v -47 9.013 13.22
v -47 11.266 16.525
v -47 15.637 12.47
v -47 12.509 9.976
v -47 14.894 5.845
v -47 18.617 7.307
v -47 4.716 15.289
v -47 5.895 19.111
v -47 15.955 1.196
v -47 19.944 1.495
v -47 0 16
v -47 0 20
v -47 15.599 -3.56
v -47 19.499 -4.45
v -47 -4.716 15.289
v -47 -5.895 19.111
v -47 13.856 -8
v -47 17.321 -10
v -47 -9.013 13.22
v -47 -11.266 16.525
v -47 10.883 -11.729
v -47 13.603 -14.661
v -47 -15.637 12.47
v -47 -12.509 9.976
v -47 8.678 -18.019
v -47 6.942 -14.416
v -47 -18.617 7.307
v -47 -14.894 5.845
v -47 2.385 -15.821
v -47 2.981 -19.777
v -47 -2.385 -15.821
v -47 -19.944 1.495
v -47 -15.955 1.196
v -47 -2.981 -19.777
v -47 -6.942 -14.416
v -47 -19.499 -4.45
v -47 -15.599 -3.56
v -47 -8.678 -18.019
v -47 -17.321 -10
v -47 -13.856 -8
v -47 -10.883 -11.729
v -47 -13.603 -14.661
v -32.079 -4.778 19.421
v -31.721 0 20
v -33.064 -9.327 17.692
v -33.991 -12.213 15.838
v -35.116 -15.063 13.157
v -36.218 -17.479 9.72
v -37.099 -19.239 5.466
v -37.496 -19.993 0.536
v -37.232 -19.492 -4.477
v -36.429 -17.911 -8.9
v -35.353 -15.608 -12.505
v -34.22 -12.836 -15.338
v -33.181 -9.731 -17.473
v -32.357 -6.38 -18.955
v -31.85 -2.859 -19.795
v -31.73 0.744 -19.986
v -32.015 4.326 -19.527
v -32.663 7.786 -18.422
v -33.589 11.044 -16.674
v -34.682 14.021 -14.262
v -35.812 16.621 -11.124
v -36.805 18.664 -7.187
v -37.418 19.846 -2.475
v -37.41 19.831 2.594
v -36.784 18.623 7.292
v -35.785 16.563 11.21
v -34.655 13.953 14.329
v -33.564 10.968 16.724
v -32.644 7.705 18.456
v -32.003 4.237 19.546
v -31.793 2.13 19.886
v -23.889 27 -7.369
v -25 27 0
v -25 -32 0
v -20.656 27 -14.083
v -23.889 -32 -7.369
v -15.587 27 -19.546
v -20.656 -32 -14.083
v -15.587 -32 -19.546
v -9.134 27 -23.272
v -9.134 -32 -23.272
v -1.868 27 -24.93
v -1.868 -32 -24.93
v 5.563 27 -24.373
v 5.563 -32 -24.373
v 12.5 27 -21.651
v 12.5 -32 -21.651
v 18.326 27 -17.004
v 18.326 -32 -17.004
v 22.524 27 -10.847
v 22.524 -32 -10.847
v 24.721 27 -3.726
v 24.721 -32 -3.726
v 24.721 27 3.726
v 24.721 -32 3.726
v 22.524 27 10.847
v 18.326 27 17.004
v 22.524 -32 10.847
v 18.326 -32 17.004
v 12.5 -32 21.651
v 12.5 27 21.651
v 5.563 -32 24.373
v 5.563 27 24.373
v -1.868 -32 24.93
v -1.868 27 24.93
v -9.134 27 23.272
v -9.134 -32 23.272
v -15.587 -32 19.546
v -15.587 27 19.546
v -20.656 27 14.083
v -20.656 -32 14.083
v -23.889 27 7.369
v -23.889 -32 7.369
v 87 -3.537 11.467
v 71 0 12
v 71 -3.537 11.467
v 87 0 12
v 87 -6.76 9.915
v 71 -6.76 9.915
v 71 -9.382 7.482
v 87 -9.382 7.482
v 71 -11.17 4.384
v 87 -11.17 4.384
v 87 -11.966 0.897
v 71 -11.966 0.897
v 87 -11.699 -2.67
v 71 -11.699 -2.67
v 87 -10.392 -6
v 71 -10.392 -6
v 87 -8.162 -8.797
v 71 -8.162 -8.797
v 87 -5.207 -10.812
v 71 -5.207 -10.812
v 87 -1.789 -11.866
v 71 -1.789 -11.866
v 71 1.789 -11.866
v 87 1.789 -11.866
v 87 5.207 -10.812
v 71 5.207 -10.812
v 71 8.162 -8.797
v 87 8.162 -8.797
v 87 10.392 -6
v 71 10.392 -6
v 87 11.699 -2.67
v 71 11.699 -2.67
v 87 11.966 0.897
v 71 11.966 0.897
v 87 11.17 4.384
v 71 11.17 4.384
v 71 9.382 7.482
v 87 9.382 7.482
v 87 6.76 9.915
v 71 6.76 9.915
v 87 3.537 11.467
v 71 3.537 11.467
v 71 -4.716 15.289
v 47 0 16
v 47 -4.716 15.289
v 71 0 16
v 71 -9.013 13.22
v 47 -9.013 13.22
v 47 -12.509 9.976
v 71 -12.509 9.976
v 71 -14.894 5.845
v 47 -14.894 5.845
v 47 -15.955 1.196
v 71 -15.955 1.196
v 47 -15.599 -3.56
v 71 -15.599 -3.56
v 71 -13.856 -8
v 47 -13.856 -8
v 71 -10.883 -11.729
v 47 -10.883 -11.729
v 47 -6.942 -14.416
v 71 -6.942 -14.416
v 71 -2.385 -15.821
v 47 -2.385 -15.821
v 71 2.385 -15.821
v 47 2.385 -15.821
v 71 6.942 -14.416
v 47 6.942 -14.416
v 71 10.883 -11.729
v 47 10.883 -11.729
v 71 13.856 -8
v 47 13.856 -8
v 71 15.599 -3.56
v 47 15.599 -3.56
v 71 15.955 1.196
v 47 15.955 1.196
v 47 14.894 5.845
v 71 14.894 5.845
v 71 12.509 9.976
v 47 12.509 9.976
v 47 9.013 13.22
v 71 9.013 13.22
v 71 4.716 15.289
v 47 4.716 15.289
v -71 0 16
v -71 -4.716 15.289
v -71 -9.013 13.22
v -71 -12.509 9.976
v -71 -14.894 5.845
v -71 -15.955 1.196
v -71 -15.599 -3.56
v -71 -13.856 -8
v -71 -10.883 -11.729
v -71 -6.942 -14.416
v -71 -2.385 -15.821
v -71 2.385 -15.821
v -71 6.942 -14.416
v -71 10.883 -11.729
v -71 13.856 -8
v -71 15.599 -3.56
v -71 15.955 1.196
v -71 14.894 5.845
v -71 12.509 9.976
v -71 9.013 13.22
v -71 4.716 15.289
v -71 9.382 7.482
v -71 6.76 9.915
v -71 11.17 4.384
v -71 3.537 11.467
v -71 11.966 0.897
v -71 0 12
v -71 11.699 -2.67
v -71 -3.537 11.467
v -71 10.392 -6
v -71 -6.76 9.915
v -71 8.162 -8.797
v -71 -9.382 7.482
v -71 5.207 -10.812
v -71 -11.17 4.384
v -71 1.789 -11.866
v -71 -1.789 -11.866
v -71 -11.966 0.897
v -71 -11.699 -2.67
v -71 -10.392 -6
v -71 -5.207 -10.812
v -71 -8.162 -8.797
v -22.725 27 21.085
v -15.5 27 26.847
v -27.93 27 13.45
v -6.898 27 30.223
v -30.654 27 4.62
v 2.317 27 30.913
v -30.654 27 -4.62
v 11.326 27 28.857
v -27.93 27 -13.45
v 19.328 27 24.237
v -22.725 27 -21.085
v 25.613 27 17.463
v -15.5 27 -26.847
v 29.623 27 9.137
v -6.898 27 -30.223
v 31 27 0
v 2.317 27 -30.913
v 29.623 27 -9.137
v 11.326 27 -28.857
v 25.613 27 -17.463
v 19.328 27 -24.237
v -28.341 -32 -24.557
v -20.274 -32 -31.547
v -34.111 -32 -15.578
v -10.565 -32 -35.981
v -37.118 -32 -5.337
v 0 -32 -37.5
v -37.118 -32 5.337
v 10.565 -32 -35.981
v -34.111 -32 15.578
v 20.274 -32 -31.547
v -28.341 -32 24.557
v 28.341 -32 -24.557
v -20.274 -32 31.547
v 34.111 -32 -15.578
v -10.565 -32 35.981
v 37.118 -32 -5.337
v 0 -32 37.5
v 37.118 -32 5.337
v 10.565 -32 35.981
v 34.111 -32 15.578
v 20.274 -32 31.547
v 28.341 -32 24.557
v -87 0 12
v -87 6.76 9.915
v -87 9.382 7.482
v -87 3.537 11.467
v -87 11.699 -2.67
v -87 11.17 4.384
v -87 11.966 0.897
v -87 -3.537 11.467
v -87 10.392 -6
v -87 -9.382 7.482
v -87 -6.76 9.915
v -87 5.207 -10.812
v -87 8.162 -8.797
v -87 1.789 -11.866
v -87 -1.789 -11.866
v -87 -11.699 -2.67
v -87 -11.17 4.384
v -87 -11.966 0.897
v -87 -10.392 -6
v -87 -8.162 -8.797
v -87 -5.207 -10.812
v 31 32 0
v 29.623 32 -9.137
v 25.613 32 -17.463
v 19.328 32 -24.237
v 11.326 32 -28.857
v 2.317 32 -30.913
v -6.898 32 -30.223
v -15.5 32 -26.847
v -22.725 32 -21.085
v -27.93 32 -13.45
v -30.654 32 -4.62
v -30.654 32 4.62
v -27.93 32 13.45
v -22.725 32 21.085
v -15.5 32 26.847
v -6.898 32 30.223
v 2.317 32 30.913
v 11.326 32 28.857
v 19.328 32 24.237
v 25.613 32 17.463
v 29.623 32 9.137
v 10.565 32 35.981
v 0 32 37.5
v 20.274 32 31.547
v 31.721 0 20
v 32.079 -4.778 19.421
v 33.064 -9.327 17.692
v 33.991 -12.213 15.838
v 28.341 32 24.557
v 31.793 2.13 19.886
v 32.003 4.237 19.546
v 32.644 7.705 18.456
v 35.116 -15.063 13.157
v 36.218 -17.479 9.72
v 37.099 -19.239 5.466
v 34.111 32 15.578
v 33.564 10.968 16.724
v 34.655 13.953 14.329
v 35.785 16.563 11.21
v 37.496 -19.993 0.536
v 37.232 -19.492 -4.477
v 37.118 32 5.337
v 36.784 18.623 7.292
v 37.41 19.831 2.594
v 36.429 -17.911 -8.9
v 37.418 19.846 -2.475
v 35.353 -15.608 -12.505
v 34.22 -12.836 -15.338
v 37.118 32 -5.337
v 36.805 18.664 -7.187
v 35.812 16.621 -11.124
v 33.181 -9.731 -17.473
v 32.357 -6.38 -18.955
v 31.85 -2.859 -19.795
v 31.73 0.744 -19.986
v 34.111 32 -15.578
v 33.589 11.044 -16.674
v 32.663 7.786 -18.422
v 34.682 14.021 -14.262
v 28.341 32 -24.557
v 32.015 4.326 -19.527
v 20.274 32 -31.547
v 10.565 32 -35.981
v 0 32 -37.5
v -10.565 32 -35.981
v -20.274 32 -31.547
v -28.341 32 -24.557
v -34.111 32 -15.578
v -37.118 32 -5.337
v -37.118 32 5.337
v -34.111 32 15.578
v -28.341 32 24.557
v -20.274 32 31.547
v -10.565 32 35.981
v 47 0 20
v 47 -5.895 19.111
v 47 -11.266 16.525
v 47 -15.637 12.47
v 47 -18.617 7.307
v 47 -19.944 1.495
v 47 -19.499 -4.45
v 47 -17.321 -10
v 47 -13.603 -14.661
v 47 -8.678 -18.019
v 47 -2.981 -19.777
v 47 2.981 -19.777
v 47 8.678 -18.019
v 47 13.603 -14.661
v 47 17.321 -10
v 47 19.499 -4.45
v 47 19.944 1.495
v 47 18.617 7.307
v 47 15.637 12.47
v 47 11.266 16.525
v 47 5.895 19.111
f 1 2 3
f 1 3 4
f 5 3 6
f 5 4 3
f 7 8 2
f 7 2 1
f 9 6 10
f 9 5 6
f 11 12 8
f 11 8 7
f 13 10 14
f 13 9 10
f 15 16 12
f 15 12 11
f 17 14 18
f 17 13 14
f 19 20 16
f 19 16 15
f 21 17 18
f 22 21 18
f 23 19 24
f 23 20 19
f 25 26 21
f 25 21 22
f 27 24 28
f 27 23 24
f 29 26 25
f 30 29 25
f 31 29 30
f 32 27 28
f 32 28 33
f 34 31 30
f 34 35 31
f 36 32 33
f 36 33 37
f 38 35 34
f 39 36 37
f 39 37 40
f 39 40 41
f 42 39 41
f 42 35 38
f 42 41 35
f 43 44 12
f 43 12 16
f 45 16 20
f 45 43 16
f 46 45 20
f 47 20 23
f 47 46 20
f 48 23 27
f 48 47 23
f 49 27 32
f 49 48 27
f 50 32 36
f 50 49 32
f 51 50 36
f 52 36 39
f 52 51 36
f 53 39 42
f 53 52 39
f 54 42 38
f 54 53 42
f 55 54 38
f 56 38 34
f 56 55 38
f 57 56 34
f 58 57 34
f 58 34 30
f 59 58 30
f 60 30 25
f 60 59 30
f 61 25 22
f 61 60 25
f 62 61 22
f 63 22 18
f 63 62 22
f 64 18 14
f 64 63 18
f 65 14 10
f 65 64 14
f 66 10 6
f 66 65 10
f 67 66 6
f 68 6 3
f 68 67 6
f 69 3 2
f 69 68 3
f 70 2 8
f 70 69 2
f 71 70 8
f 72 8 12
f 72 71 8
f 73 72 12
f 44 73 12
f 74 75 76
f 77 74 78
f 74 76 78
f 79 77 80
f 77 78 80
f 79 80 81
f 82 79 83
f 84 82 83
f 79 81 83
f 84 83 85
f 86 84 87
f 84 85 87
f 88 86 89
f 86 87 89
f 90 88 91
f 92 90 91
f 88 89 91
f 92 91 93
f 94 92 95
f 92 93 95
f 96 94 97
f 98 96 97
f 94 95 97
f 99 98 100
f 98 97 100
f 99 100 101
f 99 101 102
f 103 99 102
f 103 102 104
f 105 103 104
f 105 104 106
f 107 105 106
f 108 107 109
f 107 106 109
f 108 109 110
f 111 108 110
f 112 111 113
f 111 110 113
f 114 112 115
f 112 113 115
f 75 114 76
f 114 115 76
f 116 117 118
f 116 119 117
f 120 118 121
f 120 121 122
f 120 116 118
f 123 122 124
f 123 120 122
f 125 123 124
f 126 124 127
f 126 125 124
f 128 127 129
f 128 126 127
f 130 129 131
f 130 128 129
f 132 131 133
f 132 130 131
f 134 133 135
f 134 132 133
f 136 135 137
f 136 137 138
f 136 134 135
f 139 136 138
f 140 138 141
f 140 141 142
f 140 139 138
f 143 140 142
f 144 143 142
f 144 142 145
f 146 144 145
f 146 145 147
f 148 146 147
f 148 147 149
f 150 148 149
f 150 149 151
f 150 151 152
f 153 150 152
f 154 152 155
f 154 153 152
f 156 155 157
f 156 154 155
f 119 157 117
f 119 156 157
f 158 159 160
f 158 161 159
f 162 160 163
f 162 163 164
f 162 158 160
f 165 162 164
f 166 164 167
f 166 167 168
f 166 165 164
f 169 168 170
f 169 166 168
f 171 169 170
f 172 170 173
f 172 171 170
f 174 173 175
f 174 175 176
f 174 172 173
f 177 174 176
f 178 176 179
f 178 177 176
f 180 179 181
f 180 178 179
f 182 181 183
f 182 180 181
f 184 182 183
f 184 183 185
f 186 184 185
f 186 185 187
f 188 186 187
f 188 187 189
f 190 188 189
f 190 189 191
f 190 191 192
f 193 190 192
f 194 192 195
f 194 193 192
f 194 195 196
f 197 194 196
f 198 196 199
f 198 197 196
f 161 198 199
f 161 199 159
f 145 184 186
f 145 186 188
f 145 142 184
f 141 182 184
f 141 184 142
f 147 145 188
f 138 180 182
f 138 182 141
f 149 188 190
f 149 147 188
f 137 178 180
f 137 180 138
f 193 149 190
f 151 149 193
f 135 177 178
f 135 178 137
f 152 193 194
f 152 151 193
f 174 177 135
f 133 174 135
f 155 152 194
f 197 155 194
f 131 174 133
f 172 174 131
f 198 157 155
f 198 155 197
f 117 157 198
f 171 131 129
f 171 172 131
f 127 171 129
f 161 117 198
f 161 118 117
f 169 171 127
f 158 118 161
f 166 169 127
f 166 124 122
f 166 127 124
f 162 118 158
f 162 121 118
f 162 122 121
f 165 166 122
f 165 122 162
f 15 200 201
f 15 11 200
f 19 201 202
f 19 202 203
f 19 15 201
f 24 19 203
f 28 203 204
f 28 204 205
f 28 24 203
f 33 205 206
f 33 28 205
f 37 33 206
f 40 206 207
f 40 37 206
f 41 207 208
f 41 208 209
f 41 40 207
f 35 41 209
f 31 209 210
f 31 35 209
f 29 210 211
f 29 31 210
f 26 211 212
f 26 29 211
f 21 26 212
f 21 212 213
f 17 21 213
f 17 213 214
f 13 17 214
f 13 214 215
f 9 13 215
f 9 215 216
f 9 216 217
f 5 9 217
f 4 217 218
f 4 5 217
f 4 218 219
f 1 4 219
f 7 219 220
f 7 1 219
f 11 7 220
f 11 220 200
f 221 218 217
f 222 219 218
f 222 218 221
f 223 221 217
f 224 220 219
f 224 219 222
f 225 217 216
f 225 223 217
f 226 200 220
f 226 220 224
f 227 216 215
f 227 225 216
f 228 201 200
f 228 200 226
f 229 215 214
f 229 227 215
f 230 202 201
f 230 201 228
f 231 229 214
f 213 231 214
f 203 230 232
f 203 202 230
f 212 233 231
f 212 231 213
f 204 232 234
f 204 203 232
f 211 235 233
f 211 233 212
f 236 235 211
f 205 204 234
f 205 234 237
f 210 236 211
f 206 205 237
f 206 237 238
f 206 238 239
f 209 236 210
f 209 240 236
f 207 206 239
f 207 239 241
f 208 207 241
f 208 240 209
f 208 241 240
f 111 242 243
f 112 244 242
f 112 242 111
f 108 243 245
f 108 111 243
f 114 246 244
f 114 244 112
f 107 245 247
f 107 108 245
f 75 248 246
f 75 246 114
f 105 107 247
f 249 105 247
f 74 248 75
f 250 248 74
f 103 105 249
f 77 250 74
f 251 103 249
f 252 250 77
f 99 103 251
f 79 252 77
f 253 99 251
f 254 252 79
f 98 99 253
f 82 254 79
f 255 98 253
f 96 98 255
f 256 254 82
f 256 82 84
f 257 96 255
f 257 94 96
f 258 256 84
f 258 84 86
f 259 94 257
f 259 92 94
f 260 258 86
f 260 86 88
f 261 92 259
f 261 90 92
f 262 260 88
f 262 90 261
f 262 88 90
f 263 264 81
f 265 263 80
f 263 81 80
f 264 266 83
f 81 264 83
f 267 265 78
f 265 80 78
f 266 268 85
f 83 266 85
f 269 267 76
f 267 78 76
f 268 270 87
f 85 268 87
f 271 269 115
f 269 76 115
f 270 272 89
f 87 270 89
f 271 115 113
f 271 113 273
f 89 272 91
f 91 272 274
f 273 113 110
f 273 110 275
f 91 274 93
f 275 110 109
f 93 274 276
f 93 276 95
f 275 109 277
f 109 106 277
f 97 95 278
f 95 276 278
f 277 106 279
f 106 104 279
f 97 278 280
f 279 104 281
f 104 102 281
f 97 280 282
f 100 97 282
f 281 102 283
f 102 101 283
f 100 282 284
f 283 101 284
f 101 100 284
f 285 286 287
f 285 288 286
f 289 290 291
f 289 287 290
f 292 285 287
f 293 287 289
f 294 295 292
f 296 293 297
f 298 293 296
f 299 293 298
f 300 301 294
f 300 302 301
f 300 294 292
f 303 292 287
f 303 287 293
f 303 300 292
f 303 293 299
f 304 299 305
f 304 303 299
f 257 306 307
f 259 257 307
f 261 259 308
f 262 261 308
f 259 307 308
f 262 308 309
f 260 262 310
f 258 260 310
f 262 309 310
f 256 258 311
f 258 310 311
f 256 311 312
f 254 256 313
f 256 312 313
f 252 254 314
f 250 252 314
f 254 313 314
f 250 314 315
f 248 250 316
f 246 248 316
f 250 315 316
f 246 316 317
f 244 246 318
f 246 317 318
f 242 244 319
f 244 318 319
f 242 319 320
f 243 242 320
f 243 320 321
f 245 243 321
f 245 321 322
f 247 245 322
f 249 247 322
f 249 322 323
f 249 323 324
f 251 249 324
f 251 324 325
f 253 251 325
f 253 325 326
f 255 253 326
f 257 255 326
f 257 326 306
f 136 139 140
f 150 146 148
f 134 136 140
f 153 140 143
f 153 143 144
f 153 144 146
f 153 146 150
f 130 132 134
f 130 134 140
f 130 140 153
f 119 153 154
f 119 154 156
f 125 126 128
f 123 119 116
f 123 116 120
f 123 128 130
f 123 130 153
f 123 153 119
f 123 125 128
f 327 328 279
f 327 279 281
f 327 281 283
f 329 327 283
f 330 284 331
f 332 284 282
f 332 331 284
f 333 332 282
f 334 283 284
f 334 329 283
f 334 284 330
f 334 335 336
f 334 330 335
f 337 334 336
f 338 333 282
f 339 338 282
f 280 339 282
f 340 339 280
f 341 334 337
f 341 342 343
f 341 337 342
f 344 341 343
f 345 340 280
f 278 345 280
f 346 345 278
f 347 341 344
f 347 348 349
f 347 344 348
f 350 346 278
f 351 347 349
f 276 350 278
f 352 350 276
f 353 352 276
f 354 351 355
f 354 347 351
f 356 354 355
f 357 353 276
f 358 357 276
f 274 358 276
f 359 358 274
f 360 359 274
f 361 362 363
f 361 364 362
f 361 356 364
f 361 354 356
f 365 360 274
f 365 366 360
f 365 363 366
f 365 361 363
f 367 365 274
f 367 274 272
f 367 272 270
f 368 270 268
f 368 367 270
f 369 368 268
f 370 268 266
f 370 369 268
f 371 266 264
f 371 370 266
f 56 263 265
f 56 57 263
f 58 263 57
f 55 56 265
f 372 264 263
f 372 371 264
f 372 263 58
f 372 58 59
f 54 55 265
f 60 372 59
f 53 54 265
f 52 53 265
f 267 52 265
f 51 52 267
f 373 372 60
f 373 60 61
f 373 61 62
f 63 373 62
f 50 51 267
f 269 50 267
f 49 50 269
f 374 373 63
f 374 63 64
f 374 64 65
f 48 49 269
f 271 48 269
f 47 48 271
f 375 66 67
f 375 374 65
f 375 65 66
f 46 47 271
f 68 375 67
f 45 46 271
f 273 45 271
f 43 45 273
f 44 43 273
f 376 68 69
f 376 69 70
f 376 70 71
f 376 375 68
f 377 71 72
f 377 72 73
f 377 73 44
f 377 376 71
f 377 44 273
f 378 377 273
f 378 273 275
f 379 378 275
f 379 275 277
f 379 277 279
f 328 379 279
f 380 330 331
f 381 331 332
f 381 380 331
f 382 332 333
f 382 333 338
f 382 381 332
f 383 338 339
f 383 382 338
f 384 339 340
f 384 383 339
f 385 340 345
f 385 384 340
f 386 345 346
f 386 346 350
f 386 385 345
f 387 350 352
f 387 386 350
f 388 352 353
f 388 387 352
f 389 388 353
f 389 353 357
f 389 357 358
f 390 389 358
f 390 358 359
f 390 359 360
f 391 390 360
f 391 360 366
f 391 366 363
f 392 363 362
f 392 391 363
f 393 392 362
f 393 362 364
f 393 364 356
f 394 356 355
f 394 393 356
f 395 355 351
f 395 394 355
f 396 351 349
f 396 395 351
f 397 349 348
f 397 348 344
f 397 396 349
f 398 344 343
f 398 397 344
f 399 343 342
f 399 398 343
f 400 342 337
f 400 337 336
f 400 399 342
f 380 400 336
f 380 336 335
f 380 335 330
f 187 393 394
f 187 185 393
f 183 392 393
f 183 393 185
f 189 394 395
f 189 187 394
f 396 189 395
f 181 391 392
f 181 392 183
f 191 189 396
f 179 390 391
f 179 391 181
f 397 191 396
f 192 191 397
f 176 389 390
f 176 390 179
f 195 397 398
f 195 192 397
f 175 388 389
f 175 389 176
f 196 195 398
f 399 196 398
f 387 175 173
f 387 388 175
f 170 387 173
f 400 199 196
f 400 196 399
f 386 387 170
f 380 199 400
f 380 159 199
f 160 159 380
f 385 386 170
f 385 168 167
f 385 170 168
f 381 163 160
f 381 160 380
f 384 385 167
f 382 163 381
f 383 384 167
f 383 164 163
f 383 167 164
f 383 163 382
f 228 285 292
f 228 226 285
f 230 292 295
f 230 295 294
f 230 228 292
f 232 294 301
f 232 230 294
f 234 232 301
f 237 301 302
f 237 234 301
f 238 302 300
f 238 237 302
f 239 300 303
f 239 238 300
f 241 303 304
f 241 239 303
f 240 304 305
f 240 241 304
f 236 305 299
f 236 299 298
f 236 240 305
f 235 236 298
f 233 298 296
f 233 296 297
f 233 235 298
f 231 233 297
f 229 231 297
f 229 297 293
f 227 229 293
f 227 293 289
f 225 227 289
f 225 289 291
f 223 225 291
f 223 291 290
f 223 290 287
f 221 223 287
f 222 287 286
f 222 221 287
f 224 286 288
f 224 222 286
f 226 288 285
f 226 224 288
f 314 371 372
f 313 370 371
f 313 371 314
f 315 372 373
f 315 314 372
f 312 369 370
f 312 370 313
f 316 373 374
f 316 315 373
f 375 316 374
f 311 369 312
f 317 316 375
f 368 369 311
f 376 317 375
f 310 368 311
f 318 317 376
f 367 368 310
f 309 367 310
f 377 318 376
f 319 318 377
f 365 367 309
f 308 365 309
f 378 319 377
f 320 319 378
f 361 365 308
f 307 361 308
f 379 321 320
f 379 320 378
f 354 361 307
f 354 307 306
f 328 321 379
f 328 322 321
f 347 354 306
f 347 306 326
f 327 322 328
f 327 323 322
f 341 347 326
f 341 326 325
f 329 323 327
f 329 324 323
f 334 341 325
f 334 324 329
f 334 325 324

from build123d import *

# Parameters (mm, degrees)
SKETCH2_R           = 37.5
BOSS_EXTRUDE1_DEPTH = 32
HOLE1_D             = 50
HOLE1_CBORE_D       = 62
HOLE1_CBORE_DEPTH   = 5


with BuildPart() as part:
    # Sketch1 → Revolve1 (revolve)
    with BuildSketch(Plane(origin=(0, 0, 0), x_dir=(1, 0, 0), z_dir=(0, 1, 0)), mode=Mode.PRIVATE) as revolve1_sk:
        Polygon((-87, 0), (-87, 12), (-71, 12), (-71, 16), (-47, 16), (-47, 20), (47, 20), (47, 16), (71, 16), (71, 12), (87, 12), (87, 0), align=None)
    revolve(revolve1_sk.sketch.rotate(Axis((-87, 0, 0), (1, 0, 0)), 180), axis=Axis((-87, 0, 0), (1, 0, 0)))

    # Sketch2 → Boss-Extrude1 (add, symmetric)
    with BuildSketch(Plane(origin=(0, 0, 0), x_dir=(1, 0, 0), z_dir=(0, 1, 0))):
        with Locations(Location((0, 0, 0), (0, 0, 270))):
            Circle(SKETCH2_R)
    extrude(amount=BOSS_EXTRUDE1_DEPTH, both=True)

    # Hole1 (through all)
    with Locations(Plane(origin=(0, 32, 0), x_dir=(1, 0, 0), z_dir=(0, 1, 0))):
        with Locations((0, 0)):
            CounterBoreHole(HOLE1_D / 2, HOLE1_CBORE_D / 2, HOLE1_CBORE_DEPTH)


solid = part.part
